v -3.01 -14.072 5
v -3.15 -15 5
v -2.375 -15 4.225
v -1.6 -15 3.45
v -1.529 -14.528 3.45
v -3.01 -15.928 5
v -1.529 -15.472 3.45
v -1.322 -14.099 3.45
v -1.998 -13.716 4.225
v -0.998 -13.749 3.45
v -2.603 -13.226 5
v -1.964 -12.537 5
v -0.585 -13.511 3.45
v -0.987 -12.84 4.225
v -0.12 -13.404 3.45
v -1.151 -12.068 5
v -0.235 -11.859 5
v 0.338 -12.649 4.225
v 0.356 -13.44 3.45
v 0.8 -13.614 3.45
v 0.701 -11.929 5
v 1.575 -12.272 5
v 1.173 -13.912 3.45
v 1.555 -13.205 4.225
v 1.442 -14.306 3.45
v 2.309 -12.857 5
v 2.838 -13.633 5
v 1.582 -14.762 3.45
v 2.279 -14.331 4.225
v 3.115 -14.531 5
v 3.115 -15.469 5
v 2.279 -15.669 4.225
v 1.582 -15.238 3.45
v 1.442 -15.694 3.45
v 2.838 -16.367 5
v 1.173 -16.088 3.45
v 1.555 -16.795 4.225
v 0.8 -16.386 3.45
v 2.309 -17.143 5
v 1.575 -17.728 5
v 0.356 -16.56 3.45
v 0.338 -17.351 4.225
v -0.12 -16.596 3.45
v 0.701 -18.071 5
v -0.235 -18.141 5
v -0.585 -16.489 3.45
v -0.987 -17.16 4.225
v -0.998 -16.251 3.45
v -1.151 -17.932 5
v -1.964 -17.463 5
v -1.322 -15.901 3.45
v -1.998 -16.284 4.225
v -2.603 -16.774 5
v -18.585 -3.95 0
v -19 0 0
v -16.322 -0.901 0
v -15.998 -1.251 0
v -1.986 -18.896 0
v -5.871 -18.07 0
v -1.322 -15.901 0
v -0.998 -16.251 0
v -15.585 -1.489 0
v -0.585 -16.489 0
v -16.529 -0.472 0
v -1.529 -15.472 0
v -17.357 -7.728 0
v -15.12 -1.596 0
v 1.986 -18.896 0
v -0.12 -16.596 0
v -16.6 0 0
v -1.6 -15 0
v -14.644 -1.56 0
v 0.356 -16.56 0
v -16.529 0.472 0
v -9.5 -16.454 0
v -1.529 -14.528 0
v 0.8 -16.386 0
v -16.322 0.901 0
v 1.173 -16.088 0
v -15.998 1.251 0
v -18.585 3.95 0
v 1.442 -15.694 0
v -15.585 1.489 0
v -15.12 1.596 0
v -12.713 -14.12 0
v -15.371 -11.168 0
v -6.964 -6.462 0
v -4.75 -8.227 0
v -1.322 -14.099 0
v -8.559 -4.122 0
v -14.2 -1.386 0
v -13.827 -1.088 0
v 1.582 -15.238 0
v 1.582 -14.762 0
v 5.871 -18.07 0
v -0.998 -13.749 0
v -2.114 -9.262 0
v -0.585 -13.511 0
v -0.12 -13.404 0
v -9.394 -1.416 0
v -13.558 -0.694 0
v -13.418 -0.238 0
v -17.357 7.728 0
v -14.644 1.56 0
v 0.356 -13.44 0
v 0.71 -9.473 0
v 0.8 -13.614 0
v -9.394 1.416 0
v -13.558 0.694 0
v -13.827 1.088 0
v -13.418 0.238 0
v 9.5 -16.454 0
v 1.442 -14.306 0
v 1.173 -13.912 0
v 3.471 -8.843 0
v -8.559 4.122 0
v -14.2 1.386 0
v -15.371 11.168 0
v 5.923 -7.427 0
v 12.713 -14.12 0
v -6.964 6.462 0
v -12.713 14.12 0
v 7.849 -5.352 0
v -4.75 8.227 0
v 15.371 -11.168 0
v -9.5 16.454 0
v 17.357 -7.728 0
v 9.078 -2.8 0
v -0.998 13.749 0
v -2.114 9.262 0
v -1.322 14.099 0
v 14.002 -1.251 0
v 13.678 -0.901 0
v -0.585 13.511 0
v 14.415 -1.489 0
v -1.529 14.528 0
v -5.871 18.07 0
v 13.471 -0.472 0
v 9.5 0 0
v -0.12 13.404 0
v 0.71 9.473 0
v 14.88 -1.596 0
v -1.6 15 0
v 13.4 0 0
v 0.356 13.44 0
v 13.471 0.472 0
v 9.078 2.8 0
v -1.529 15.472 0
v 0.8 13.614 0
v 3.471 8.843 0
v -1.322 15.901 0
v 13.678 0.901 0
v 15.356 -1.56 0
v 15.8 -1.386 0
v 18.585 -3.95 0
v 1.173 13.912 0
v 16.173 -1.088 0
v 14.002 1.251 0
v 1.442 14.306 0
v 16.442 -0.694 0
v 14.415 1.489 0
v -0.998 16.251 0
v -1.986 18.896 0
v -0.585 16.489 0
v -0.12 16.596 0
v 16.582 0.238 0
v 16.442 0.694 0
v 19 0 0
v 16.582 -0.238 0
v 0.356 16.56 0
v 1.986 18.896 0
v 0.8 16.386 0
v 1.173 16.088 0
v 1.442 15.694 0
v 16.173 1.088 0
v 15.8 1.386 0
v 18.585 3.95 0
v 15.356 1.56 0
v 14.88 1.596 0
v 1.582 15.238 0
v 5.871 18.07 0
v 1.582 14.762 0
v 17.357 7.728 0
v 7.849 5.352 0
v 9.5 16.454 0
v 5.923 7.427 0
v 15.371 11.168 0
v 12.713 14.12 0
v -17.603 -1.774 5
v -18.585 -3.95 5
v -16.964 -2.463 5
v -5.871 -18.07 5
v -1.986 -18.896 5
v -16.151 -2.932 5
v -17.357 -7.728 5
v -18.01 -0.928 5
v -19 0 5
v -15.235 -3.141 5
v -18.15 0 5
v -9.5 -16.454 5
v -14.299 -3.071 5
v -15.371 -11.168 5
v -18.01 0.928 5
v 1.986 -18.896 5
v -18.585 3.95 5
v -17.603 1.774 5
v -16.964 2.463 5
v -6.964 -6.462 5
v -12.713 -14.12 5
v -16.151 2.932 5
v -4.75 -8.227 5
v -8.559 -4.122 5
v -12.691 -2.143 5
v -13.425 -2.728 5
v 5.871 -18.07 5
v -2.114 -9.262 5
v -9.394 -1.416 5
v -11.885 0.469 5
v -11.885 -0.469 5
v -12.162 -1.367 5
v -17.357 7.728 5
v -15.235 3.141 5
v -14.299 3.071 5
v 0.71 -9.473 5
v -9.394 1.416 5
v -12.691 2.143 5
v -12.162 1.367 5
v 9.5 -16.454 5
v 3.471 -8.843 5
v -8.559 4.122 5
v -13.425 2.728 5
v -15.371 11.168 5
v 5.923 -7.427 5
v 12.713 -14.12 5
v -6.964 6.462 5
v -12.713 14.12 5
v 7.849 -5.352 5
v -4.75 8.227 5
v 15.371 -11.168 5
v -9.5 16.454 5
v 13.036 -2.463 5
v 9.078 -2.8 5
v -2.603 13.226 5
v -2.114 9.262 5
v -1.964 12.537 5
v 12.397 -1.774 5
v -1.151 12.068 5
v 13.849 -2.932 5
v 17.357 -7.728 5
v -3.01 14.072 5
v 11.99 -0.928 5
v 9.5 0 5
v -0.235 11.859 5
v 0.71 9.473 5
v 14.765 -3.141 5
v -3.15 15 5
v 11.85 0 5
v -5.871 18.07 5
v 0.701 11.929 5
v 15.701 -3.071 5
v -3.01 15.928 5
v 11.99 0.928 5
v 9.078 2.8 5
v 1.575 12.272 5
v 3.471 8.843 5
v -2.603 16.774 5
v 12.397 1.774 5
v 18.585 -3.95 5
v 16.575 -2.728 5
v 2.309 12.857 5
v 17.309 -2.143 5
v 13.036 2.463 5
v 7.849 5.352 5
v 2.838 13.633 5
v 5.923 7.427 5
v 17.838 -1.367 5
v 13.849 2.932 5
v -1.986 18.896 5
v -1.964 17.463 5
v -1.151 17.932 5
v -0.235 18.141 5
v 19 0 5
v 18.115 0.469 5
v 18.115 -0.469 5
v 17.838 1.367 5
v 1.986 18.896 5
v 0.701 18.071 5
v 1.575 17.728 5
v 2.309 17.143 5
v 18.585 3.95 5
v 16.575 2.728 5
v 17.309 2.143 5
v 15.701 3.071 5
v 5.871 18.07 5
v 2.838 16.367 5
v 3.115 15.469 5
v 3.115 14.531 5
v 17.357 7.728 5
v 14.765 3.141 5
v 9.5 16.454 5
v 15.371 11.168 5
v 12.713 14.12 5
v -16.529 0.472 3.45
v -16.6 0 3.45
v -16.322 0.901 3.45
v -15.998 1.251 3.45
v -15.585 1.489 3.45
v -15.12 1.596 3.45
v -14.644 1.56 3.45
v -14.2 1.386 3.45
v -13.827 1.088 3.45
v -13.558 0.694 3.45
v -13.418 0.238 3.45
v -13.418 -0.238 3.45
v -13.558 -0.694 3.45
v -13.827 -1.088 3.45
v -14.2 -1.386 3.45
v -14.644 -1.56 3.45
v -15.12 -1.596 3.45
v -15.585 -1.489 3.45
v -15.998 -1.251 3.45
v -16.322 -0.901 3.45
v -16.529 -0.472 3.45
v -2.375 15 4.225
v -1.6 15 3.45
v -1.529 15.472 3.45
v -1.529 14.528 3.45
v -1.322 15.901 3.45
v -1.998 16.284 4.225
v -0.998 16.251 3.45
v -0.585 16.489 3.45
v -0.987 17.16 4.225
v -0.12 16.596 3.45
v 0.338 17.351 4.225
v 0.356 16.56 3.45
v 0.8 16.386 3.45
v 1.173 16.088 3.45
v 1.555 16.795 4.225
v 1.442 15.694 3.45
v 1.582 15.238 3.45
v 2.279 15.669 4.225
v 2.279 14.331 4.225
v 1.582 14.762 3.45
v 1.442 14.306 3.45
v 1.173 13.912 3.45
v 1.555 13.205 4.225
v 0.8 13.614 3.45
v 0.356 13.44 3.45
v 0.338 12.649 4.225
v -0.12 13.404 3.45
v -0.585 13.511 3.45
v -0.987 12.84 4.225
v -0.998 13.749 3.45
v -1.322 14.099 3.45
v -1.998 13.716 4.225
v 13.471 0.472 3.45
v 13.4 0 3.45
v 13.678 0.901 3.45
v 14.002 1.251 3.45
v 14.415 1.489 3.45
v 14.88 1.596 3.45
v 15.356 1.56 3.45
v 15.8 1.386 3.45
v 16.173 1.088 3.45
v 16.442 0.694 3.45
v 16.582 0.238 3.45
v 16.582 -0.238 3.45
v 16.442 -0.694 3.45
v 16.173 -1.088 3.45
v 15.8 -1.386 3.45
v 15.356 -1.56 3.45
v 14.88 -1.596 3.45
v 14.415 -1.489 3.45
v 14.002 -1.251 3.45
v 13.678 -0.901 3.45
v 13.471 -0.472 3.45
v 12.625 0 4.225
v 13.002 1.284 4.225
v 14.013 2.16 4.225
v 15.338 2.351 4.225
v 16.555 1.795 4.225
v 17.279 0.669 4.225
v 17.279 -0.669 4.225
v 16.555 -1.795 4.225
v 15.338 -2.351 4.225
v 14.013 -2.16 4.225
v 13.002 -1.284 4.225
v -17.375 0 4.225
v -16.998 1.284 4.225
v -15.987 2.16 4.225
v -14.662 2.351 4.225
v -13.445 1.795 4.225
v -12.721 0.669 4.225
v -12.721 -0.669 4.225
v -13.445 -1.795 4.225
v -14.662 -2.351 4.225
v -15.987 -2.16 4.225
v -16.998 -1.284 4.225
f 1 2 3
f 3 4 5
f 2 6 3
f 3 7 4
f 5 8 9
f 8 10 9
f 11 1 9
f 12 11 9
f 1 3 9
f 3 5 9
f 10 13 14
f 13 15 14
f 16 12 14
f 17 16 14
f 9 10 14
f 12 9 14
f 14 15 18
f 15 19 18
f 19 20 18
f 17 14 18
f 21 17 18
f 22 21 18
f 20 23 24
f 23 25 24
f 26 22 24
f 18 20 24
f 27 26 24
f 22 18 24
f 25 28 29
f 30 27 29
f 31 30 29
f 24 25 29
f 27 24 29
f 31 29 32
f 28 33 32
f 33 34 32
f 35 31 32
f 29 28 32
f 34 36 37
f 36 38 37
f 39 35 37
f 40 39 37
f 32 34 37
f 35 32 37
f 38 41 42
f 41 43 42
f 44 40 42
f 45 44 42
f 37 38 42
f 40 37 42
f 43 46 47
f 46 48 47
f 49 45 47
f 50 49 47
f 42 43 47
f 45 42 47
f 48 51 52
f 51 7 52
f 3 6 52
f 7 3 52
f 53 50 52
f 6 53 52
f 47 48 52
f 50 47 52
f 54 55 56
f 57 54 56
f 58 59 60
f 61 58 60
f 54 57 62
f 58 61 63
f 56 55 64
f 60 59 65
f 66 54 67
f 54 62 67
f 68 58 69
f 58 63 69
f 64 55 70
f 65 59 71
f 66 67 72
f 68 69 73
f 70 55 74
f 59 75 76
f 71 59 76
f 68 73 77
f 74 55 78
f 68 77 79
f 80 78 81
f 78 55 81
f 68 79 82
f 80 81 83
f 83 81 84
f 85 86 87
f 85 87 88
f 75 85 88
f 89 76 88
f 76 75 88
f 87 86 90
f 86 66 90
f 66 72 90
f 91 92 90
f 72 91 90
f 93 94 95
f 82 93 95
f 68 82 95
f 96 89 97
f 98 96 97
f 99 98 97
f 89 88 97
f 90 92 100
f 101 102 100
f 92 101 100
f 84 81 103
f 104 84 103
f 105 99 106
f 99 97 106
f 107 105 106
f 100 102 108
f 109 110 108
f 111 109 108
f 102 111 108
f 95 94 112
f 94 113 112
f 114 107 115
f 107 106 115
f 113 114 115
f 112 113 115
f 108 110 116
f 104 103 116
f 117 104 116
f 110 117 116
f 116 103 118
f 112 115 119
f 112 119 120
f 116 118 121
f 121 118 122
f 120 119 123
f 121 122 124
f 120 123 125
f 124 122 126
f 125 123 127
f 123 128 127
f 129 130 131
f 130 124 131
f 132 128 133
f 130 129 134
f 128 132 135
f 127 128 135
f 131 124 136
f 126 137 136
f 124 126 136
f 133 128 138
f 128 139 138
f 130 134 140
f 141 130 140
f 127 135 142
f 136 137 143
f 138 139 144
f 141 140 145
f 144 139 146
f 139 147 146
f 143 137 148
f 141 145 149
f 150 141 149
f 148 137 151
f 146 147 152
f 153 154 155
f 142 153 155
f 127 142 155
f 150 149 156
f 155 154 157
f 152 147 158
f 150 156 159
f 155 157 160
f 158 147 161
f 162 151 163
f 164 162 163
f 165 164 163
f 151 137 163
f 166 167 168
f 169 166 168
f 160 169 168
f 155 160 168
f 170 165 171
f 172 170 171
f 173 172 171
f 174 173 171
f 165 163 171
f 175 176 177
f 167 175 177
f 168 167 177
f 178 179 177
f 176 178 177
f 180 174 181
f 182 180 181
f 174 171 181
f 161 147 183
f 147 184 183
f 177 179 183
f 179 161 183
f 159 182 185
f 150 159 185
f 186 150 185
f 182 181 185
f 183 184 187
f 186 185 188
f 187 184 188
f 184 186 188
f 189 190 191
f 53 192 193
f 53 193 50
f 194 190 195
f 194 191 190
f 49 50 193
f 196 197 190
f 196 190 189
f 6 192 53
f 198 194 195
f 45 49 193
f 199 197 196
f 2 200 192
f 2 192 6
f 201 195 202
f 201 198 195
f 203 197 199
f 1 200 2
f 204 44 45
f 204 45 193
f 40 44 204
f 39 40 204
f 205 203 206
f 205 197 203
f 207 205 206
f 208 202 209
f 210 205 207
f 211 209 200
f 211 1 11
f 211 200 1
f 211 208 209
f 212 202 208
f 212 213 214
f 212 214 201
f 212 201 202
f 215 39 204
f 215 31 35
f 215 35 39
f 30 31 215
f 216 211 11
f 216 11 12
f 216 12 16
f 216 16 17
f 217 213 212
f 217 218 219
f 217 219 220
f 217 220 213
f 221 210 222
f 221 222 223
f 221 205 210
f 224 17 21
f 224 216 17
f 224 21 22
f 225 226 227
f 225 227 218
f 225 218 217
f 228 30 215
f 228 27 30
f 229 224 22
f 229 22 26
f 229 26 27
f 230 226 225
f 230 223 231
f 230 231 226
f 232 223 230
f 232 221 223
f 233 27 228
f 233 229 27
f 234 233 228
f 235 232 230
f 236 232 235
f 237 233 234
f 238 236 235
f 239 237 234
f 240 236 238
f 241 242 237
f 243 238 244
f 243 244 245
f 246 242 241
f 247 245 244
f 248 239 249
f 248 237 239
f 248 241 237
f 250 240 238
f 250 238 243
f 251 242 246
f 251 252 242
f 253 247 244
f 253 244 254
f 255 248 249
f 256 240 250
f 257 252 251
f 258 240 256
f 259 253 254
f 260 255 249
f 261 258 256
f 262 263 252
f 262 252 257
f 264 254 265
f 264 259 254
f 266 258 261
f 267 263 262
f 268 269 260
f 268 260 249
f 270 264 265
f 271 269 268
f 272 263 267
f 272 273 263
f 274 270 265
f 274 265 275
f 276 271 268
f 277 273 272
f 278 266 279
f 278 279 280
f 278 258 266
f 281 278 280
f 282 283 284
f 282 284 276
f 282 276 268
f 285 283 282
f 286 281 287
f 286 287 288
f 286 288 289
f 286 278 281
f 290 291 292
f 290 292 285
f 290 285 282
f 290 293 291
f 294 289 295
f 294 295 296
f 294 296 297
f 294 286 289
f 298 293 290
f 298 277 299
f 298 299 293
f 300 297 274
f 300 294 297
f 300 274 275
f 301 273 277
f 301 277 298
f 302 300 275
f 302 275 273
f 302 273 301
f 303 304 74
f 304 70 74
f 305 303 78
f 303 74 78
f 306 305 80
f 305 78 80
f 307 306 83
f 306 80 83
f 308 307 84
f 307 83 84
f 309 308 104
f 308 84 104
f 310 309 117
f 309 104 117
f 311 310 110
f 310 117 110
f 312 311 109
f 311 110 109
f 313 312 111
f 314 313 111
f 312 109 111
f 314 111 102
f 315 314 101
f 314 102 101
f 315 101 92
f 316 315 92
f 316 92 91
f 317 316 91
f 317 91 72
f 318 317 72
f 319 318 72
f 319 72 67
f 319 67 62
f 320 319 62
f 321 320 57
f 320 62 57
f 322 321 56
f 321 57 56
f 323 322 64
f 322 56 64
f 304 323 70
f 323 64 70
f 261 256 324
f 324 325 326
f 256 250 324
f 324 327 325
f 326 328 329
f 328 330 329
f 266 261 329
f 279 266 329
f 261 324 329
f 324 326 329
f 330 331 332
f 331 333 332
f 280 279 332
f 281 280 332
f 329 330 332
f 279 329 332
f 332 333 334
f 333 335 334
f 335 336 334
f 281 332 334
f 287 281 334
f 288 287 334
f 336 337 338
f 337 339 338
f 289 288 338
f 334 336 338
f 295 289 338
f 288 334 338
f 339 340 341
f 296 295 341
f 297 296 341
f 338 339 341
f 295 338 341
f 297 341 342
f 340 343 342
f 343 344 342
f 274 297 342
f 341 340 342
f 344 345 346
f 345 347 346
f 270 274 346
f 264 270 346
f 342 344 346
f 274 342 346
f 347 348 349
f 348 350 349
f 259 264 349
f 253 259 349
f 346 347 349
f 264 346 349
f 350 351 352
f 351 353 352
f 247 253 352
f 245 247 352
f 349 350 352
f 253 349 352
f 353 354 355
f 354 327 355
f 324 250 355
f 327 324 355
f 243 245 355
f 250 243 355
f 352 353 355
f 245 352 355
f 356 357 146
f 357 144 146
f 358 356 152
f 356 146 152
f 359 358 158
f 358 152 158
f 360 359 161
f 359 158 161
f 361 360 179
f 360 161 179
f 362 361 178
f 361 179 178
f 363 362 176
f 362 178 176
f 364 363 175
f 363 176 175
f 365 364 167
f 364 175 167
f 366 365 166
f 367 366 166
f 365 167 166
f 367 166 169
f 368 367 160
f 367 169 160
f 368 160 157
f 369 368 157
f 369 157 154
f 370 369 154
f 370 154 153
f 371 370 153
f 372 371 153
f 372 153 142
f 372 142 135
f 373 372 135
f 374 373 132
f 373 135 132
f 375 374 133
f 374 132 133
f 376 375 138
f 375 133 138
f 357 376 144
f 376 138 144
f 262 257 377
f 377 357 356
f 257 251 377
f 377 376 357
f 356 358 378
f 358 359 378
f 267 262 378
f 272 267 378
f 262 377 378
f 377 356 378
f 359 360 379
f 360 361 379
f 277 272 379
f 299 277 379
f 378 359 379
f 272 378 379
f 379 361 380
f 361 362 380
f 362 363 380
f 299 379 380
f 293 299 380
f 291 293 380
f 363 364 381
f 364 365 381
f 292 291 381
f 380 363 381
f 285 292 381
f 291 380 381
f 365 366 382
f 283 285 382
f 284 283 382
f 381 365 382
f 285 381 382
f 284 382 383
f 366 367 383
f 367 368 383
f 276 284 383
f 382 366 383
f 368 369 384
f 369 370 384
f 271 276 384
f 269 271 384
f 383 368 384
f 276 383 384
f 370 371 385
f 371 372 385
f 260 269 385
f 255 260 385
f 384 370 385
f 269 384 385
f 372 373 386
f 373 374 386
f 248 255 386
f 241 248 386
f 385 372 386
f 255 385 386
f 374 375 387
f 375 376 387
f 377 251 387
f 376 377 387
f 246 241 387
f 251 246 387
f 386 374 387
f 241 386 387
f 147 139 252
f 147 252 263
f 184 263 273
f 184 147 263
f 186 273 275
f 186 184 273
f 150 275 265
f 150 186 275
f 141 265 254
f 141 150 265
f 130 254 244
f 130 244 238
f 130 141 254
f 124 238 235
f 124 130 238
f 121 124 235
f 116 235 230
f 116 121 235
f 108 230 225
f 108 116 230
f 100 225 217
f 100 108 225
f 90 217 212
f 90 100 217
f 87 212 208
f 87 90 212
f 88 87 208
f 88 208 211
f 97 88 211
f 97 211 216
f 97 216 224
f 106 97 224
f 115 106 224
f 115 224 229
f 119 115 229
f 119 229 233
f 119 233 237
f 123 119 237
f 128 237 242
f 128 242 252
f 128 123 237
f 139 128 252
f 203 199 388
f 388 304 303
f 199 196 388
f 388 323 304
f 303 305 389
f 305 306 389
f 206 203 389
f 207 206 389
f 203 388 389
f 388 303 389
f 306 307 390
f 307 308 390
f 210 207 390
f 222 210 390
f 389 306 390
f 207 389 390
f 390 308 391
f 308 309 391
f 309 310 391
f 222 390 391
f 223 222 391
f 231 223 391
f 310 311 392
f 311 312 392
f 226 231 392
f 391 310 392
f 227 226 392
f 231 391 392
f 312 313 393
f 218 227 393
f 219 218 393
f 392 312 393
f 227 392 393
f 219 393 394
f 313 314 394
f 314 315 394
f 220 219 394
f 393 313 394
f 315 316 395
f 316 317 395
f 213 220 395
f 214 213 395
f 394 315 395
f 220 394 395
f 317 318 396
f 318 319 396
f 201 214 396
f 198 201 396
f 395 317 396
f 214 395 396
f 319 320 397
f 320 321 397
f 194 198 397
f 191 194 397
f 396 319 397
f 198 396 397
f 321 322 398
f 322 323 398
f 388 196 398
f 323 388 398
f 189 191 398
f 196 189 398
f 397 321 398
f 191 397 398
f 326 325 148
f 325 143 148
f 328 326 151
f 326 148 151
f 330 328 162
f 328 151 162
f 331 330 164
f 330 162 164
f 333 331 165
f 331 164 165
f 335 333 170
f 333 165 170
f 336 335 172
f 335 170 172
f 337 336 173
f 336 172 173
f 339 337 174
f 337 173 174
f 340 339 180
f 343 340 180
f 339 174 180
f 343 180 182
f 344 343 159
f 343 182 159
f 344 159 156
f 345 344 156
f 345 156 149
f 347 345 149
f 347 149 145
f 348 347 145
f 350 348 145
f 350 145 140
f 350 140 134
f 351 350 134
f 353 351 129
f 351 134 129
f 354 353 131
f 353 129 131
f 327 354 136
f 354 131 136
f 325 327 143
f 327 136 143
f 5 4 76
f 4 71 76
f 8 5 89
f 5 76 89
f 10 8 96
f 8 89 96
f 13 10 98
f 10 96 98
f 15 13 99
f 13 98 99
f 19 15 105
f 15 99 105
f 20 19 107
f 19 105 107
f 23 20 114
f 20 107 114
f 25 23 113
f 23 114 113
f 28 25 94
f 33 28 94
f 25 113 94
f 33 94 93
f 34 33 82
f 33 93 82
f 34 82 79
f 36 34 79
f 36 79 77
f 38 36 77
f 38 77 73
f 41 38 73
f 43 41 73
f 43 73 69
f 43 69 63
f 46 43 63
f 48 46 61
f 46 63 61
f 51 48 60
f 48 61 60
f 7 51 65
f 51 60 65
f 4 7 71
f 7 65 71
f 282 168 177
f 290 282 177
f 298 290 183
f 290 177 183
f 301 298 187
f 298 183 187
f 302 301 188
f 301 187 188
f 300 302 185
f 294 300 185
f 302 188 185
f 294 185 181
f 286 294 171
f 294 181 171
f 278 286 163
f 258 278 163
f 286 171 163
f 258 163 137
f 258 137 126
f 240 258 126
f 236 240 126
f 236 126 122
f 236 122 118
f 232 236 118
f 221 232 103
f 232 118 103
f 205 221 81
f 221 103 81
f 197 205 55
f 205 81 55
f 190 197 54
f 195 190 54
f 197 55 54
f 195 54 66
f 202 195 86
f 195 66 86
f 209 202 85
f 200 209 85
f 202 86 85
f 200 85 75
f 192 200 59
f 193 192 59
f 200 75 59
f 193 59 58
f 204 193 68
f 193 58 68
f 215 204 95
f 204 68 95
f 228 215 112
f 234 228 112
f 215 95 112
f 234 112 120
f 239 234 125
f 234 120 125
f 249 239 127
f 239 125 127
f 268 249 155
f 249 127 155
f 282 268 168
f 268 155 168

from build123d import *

# Parameters (mm, degrees)
SKETCH_1_R                   = 19
SKETCH_1_R_2                 = 9.5
EXTRUDE_1_DEPTH              = 5
HOLE_WIZARD_M3_1_D           = 3.2
HOLE_WIZARD_M3_1_CSINK_D     = 6.3
HOLE_WIZARD_M3_1_CSINK_ANGLE = 90


with BuildPart() as part:
    # ｽｹｯﾁ1 → ﾎﾞｽ - 押し出し1 (new body)
    with BuildSketch(Plane.XY):
        Circle(SKETCH_1_R)
        Circle(SKETCH_1_R_2, mode=Mode.SUBTRACT)
    extrude(amount=EXTRUDE_1_DEPTH)

    # M3 丸皿ねじ用皿穴1 (through all)
    with Locations(Plane(origin=(0, 15, 5), x_dir=(1, 0, 0), z_dir=(0, 0, 1))):
        with Locations((0, 0), (15, -15), (0, -30), (-15, -15)):
            CounterSinkHole(HOLE_WIZARD_M3_1_D / 2, HOLE_WIZARD_M3_1_CSINK_D / 2, counter_sink_angle=HOLE_WIZARD_M3_1_CSINK_ANGLE)


solid = part.part
